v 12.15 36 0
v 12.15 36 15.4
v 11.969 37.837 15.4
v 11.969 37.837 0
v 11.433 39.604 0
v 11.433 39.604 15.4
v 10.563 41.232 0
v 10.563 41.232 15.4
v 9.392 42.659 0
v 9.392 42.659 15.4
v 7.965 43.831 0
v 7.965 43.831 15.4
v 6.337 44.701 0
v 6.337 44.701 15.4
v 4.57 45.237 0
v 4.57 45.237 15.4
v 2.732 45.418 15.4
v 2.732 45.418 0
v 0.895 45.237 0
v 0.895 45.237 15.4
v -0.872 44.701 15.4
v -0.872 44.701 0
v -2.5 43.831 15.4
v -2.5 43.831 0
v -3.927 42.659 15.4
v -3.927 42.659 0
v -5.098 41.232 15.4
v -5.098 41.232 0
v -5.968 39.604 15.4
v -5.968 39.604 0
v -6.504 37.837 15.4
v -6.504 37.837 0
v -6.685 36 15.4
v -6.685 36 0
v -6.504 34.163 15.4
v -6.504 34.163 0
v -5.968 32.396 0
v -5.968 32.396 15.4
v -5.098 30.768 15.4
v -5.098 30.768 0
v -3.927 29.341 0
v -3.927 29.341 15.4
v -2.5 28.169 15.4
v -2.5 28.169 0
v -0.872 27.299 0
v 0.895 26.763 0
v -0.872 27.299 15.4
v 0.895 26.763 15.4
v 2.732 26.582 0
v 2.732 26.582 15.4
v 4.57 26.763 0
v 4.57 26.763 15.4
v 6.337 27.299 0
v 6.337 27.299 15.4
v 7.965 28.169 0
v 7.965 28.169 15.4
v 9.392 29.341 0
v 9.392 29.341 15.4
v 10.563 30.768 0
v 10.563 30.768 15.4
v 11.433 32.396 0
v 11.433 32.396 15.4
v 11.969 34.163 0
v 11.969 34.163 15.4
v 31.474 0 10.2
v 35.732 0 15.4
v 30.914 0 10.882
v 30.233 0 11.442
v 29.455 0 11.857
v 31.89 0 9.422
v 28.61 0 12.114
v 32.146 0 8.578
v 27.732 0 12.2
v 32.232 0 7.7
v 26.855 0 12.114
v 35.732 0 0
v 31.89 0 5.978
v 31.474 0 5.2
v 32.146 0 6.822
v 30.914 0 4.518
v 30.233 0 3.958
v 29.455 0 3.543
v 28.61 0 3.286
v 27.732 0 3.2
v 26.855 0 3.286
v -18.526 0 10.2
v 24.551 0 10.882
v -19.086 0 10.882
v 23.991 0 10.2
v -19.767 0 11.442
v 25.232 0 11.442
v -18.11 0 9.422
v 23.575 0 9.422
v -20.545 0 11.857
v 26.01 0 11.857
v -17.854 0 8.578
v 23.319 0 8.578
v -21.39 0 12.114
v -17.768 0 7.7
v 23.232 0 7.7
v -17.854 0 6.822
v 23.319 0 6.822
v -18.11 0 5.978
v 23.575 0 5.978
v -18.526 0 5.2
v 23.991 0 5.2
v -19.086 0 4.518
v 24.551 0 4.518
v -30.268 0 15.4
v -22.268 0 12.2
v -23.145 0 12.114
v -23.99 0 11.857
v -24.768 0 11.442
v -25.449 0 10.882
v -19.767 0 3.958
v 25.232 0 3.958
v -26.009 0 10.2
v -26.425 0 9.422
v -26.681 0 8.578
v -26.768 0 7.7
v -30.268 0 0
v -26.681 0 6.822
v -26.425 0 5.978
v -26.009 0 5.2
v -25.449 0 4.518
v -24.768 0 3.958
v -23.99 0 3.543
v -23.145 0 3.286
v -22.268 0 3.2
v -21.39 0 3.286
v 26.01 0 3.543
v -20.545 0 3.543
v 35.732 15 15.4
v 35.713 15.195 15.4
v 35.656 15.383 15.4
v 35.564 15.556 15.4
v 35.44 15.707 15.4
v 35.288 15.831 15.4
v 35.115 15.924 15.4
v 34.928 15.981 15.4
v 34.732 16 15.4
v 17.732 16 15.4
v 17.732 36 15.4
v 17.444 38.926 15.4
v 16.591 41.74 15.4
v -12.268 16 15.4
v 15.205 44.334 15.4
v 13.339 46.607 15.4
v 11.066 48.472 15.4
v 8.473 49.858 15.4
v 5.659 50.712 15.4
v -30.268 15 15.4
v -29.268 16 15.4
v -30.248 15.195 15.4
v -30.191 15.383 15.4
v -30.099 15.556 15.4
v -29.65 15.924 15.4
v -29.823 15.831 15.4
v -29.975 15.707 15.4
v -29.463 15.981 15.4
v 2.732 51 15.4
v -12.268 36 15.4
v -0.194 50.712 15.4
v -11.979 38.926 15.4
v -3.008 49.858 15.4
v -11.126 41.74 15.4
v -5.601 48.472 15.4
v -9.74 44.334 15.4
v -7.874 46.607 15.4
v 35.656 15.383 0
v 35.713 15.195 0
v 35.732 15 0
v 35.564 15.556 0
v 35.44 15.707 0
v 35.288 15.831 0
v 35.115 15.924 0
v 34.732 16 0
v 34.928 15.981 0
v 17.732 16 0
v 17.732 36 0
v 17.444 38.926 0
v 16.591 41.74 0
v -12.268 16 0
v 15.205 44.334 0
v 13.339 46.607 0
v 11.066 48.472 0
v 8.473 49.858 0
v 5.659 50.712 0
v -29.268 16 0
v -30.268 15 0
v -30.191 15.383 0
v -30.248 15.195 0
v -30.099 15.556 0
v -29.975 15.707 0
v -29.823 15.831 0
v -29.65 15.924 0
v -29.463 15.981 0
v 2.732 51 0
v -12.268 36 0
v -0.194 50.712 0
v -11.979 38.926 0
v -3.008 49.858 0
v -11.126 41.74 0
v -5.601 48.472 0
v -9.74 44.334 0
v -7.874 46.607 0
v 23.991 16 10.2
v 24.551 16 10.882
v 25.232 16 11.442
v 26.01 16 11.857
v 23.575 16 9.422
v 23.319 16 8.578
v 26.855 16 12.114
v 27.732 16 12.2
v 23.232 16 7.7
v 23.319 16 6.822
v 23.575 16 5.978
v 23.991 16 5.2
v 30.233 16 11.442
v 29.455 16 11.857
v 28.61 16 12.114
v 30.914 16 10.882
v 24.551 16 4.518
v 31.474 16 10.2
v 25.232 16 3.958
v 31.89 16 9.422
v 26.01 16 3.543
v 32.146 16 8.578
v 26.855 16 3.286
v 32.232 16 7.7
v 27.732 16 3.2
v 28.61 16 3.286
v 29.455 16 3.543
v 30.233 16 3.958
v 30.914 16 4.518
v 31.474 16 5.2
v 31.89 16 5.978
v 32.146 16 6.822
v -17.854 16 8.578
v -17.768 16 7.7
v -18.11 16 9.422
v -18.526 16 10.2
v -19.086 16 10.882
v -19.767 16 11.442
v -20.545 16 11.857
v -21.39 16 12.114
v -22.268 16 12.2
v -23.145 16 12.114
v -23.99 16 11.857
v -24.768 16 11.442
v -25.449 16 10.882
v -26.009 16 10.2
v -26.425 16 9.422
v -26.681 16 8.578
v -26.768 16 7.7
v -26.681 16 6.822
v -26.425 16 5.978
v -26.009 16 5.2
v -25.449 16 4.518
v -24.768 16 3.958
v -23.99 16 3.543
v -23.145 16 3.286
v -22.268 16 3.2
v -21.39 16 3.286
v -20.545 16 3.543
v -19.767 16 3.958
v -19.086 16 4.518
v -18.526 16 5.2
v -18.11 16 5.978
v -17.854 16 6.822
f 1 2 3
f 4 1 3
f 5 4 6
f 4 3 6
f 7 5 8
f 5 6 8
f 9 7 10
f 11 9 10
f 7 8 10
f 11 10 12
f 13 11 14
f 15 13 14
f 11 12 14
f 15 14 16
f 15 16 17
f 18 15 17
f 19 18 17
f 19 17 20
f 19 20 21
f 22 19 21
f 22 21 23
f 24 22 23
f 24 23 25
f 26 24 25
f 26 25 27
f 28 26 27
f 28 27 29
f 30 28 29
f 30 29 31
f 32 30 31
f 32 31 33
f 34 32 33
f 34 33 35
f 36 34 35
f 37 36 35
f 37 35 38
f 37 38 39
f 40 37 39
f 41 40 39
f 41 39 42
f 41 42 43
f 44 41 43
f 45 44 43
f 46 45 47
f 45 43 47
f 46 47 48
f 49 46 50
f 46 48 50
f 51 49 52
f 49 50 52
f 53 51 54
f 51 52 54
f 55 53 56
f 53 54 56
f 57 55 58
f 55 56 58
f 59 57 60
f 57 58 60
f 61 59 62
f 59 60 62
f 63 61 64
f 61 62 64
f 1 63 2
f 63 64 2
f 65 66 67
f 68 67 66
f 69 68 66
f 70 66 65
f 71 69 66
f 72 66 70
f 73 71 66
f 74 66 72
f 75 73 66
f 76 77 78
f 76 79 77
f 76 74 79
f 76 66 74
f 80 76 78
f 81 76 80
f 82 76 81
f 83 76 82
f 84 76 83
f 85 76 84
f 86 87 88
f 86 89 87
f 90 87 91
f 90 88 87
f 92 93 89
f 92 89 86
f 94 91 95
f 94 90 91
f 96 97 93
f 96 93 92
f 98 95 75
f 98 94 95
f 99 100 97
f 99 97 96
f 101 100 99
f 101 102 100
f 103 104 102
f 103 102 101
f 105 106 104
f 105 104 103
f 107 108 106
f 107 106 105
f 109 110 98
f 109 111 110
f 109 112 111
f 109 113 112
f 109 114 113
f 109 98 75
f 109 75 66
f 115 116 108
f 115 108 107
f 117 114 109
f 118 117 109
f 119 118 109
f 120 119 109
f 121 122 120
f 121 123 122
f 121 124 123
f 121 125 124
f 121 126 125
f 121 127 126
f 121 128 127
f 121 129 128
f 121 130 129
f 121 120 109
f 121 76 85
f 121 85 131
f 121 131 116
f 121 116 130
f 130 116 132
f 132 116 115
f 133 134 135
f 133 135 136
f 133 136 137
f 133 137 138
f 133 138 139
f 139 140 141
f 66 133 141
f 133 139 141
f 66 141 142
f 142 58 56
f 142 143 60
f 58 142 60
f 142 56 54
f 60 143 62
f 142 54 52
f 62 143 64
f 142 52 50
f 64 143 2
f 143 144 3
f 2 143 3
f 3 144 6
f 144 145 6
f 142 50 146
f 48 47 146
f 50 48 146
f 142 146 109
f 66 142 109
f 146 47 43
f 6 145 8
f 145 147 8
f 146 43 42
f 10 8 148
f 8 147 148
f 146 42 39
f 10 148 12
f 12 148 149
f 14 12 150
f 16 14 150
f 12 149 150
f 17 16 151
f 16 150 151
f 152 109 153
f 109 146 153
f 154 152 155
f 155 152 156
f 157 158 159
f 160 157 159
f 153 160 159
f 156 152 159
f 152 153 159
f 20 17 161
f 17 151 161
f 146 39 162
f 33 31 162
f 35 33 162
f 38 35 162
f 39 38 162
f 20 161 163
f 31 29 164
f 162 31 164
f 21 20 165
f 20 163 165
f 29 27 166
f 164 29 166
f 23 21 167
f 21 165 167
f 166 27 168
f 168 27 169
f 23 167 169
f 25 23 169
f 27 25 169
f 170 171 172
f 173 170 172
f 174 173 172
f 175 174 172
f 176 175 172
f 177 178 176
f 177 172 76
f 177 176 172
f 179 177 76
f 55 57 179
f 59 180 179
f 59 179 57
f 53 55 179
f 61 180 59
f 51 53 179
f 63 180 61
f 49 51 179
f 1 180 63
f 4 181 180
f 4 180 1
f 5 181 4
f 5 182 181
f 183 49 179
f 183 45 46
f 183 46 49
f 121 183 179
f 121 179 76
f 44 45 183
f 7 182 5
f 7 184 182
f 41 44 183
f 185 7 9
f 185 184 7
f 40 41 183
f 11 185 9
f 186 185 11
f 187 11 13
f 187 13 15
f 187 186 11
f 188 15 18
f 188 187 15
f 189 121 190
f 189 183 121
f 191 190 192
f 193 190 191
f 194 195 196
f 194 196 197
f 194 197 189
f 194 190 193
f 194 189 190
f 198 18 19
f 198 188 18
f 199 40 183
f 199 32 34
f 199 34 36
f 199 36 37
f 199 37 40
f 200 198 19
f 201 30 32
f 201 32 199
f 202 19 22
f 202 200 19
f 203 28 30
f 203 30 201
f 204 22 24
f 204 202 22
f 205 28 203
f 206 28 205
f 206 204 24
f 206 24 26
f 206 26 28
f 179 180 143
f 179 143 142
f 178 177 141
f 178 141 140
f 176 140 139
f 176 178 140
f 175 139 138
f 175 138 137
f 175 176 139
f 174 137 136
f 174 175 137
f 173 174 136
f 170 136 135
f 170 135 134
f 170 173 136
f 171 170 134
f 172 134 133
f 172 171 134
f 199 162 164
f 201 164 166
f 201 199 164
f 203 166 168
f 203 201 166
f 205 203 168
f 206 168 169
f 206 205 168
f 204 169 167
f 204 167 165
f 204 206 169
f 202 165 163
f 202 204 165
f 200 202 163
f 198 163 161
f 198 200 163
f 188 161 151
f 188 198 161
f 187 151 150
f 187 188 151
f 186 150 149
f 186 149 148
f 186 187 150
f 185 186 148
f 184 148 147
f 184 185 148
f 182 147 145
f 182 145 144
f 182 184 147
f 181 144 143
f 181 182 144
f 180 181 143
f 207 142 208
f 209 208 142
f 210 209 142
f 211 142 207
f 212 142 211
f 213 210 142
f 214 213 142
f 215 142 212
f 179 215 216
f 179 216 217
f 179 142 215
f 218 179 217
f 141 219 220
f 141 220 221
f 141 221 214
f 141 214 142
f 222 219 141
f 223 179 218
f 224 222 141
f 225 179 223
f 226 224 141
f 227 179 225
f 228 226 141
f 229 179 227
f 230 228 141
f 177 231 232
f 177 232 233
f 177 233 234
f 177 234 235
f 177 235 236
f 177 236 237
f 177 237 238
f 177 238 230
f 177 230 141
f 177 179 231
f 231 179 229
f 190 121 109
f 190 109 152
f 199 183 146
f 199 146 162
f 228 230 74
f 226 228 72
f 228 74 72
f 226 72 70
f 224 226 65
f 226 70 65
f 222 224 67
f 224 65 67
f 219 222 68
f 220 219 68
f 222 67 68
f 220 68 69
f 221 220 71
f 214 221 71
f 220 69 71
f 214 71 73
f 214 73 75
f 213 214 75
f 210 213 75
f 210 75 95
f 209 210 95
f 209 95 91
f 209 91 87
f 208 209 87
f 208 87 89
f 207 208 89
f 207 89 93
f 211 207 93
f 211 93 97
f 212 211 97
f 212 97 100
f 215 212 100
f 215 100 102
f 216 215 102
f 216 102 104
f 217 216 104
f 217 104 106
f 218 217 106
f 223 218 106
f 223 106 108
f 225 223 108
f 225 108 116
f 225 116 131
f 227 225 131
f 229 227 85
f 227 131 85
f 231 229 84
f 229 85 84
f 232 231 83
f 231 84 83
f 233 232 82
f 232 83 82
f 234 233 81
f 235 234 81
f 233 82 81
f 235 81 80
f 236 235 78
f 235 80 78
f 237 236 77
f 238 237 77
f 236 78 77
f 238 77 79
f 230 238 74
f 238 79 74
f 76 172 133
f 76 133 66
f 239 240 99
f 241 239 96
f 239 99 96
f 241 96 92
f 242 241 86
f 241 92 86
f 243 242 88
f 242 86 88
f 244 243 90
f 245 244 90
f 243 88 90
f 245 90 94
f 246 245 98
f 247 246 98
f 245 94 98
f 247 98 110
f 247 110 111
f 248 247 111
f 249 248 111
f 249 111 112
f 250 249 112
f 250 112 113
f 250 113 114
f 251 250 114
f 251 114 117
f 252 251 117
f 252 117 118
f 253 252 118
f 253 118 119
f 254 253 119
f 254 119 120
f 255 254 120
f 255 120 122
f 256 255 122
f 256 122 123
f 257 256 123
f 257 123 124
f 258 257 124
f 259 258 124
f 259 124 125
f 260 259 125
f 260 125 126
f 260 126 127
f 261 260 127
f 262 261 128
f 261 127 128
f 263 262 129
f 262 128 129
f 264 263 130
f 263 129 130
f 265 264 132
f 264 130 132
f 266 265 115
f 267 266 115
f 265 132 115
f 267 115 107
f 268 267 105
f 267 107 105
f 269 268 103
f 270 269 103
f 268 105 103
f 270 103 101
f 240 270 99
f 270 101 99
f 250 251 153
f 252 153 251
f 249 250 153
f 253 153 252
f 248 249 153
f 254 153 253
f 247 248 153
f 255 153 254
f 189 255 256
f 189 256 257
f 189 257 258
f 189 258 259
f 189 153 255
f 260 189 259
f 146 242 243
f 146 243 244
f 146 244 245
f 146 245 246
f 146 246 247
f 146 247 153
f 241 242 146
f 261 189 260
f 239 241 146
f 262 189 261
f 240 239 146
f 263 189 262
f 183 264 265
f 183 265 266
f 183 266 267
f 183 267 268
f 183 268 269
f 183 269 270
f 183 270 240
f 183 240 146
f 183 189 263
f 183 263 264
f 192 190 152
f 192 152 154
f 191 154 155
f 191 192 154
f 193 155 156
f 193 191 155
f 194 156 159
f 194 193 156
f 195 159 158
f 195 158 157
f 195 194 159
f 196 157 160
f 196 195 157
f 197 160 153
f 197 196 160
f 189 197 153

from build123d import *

# Parameters (mm, degrees)
SALIENTE_EXTRUIR1_DEPTH = 15.4
CROQUIS2_R              = 9.417866401
CORTAR_EXTRUIR1_DEPTH   = 16.4
CROQUIS3_R              = 4.5
CORTAR_EXTRUIR2_DEPTH   = 52


with BuildPart() as part:
    # Croquis1 → Saliente-Extruir1 (new body)
    with BuildSketch(Plane.XY):
        with BuildLine():
            Line((-30.267515924, 0), (-30.267515924, 15))
            ThreePointArc((-30.267515924, 15), (-29.974622705, 15.707106781), (-29.267515924, 16))
            Line((-29.267515924, 16), (-12.267515924, 16))
            Line((-12.267515924, 16), (-12.267515924, 36))
            ThreePointArc((-12.267515924, 36), (2.732484076, 51), (17.732484076, 36))
            Line((17.732484076, 36), (17.732484076, 16))
            Line((17.732484076, 16), (34.732484076, 16))
            ThreePointArc((34.732484076, 16), (35.439590858, 15.707106781), (35.732484076, 15))
            Line((35.732484076, 15), (35.732484076, 0))
            Line((35.732484076, 0), (-30.267515924, 0))
        make_face()
    extrude(amount=SALIENTE_EXTRUIR1_DEPTH)

    # Croquis2 → Cortar-Extruir1 (cut, through all)
    with BuildSketch(Plane.XY.offset(15.4)):
        with Locations((2.732484076, 36)):
            Circle(CROQUIS2_R)
    extrude(amount=-CORTAR_EXTRUIR1_DEPTH, mode=Mode.SUBTRACT)

    # Croquis3 → Cortar-Extruir2 (cut, through all)
    with BuildSketch(Plane.XZ):
        with Locations((-22.267515924, 7.7)):
            Circle(CROQUIS3_R)
        with Locations((27.732484076, 7.7)):
            Circle(CROQUIS3_R)
    extrude(amount=-CORTAR_EXTRUIR2_DEPTH, mode=Mode.SUBTRACT)


solid = part.part
